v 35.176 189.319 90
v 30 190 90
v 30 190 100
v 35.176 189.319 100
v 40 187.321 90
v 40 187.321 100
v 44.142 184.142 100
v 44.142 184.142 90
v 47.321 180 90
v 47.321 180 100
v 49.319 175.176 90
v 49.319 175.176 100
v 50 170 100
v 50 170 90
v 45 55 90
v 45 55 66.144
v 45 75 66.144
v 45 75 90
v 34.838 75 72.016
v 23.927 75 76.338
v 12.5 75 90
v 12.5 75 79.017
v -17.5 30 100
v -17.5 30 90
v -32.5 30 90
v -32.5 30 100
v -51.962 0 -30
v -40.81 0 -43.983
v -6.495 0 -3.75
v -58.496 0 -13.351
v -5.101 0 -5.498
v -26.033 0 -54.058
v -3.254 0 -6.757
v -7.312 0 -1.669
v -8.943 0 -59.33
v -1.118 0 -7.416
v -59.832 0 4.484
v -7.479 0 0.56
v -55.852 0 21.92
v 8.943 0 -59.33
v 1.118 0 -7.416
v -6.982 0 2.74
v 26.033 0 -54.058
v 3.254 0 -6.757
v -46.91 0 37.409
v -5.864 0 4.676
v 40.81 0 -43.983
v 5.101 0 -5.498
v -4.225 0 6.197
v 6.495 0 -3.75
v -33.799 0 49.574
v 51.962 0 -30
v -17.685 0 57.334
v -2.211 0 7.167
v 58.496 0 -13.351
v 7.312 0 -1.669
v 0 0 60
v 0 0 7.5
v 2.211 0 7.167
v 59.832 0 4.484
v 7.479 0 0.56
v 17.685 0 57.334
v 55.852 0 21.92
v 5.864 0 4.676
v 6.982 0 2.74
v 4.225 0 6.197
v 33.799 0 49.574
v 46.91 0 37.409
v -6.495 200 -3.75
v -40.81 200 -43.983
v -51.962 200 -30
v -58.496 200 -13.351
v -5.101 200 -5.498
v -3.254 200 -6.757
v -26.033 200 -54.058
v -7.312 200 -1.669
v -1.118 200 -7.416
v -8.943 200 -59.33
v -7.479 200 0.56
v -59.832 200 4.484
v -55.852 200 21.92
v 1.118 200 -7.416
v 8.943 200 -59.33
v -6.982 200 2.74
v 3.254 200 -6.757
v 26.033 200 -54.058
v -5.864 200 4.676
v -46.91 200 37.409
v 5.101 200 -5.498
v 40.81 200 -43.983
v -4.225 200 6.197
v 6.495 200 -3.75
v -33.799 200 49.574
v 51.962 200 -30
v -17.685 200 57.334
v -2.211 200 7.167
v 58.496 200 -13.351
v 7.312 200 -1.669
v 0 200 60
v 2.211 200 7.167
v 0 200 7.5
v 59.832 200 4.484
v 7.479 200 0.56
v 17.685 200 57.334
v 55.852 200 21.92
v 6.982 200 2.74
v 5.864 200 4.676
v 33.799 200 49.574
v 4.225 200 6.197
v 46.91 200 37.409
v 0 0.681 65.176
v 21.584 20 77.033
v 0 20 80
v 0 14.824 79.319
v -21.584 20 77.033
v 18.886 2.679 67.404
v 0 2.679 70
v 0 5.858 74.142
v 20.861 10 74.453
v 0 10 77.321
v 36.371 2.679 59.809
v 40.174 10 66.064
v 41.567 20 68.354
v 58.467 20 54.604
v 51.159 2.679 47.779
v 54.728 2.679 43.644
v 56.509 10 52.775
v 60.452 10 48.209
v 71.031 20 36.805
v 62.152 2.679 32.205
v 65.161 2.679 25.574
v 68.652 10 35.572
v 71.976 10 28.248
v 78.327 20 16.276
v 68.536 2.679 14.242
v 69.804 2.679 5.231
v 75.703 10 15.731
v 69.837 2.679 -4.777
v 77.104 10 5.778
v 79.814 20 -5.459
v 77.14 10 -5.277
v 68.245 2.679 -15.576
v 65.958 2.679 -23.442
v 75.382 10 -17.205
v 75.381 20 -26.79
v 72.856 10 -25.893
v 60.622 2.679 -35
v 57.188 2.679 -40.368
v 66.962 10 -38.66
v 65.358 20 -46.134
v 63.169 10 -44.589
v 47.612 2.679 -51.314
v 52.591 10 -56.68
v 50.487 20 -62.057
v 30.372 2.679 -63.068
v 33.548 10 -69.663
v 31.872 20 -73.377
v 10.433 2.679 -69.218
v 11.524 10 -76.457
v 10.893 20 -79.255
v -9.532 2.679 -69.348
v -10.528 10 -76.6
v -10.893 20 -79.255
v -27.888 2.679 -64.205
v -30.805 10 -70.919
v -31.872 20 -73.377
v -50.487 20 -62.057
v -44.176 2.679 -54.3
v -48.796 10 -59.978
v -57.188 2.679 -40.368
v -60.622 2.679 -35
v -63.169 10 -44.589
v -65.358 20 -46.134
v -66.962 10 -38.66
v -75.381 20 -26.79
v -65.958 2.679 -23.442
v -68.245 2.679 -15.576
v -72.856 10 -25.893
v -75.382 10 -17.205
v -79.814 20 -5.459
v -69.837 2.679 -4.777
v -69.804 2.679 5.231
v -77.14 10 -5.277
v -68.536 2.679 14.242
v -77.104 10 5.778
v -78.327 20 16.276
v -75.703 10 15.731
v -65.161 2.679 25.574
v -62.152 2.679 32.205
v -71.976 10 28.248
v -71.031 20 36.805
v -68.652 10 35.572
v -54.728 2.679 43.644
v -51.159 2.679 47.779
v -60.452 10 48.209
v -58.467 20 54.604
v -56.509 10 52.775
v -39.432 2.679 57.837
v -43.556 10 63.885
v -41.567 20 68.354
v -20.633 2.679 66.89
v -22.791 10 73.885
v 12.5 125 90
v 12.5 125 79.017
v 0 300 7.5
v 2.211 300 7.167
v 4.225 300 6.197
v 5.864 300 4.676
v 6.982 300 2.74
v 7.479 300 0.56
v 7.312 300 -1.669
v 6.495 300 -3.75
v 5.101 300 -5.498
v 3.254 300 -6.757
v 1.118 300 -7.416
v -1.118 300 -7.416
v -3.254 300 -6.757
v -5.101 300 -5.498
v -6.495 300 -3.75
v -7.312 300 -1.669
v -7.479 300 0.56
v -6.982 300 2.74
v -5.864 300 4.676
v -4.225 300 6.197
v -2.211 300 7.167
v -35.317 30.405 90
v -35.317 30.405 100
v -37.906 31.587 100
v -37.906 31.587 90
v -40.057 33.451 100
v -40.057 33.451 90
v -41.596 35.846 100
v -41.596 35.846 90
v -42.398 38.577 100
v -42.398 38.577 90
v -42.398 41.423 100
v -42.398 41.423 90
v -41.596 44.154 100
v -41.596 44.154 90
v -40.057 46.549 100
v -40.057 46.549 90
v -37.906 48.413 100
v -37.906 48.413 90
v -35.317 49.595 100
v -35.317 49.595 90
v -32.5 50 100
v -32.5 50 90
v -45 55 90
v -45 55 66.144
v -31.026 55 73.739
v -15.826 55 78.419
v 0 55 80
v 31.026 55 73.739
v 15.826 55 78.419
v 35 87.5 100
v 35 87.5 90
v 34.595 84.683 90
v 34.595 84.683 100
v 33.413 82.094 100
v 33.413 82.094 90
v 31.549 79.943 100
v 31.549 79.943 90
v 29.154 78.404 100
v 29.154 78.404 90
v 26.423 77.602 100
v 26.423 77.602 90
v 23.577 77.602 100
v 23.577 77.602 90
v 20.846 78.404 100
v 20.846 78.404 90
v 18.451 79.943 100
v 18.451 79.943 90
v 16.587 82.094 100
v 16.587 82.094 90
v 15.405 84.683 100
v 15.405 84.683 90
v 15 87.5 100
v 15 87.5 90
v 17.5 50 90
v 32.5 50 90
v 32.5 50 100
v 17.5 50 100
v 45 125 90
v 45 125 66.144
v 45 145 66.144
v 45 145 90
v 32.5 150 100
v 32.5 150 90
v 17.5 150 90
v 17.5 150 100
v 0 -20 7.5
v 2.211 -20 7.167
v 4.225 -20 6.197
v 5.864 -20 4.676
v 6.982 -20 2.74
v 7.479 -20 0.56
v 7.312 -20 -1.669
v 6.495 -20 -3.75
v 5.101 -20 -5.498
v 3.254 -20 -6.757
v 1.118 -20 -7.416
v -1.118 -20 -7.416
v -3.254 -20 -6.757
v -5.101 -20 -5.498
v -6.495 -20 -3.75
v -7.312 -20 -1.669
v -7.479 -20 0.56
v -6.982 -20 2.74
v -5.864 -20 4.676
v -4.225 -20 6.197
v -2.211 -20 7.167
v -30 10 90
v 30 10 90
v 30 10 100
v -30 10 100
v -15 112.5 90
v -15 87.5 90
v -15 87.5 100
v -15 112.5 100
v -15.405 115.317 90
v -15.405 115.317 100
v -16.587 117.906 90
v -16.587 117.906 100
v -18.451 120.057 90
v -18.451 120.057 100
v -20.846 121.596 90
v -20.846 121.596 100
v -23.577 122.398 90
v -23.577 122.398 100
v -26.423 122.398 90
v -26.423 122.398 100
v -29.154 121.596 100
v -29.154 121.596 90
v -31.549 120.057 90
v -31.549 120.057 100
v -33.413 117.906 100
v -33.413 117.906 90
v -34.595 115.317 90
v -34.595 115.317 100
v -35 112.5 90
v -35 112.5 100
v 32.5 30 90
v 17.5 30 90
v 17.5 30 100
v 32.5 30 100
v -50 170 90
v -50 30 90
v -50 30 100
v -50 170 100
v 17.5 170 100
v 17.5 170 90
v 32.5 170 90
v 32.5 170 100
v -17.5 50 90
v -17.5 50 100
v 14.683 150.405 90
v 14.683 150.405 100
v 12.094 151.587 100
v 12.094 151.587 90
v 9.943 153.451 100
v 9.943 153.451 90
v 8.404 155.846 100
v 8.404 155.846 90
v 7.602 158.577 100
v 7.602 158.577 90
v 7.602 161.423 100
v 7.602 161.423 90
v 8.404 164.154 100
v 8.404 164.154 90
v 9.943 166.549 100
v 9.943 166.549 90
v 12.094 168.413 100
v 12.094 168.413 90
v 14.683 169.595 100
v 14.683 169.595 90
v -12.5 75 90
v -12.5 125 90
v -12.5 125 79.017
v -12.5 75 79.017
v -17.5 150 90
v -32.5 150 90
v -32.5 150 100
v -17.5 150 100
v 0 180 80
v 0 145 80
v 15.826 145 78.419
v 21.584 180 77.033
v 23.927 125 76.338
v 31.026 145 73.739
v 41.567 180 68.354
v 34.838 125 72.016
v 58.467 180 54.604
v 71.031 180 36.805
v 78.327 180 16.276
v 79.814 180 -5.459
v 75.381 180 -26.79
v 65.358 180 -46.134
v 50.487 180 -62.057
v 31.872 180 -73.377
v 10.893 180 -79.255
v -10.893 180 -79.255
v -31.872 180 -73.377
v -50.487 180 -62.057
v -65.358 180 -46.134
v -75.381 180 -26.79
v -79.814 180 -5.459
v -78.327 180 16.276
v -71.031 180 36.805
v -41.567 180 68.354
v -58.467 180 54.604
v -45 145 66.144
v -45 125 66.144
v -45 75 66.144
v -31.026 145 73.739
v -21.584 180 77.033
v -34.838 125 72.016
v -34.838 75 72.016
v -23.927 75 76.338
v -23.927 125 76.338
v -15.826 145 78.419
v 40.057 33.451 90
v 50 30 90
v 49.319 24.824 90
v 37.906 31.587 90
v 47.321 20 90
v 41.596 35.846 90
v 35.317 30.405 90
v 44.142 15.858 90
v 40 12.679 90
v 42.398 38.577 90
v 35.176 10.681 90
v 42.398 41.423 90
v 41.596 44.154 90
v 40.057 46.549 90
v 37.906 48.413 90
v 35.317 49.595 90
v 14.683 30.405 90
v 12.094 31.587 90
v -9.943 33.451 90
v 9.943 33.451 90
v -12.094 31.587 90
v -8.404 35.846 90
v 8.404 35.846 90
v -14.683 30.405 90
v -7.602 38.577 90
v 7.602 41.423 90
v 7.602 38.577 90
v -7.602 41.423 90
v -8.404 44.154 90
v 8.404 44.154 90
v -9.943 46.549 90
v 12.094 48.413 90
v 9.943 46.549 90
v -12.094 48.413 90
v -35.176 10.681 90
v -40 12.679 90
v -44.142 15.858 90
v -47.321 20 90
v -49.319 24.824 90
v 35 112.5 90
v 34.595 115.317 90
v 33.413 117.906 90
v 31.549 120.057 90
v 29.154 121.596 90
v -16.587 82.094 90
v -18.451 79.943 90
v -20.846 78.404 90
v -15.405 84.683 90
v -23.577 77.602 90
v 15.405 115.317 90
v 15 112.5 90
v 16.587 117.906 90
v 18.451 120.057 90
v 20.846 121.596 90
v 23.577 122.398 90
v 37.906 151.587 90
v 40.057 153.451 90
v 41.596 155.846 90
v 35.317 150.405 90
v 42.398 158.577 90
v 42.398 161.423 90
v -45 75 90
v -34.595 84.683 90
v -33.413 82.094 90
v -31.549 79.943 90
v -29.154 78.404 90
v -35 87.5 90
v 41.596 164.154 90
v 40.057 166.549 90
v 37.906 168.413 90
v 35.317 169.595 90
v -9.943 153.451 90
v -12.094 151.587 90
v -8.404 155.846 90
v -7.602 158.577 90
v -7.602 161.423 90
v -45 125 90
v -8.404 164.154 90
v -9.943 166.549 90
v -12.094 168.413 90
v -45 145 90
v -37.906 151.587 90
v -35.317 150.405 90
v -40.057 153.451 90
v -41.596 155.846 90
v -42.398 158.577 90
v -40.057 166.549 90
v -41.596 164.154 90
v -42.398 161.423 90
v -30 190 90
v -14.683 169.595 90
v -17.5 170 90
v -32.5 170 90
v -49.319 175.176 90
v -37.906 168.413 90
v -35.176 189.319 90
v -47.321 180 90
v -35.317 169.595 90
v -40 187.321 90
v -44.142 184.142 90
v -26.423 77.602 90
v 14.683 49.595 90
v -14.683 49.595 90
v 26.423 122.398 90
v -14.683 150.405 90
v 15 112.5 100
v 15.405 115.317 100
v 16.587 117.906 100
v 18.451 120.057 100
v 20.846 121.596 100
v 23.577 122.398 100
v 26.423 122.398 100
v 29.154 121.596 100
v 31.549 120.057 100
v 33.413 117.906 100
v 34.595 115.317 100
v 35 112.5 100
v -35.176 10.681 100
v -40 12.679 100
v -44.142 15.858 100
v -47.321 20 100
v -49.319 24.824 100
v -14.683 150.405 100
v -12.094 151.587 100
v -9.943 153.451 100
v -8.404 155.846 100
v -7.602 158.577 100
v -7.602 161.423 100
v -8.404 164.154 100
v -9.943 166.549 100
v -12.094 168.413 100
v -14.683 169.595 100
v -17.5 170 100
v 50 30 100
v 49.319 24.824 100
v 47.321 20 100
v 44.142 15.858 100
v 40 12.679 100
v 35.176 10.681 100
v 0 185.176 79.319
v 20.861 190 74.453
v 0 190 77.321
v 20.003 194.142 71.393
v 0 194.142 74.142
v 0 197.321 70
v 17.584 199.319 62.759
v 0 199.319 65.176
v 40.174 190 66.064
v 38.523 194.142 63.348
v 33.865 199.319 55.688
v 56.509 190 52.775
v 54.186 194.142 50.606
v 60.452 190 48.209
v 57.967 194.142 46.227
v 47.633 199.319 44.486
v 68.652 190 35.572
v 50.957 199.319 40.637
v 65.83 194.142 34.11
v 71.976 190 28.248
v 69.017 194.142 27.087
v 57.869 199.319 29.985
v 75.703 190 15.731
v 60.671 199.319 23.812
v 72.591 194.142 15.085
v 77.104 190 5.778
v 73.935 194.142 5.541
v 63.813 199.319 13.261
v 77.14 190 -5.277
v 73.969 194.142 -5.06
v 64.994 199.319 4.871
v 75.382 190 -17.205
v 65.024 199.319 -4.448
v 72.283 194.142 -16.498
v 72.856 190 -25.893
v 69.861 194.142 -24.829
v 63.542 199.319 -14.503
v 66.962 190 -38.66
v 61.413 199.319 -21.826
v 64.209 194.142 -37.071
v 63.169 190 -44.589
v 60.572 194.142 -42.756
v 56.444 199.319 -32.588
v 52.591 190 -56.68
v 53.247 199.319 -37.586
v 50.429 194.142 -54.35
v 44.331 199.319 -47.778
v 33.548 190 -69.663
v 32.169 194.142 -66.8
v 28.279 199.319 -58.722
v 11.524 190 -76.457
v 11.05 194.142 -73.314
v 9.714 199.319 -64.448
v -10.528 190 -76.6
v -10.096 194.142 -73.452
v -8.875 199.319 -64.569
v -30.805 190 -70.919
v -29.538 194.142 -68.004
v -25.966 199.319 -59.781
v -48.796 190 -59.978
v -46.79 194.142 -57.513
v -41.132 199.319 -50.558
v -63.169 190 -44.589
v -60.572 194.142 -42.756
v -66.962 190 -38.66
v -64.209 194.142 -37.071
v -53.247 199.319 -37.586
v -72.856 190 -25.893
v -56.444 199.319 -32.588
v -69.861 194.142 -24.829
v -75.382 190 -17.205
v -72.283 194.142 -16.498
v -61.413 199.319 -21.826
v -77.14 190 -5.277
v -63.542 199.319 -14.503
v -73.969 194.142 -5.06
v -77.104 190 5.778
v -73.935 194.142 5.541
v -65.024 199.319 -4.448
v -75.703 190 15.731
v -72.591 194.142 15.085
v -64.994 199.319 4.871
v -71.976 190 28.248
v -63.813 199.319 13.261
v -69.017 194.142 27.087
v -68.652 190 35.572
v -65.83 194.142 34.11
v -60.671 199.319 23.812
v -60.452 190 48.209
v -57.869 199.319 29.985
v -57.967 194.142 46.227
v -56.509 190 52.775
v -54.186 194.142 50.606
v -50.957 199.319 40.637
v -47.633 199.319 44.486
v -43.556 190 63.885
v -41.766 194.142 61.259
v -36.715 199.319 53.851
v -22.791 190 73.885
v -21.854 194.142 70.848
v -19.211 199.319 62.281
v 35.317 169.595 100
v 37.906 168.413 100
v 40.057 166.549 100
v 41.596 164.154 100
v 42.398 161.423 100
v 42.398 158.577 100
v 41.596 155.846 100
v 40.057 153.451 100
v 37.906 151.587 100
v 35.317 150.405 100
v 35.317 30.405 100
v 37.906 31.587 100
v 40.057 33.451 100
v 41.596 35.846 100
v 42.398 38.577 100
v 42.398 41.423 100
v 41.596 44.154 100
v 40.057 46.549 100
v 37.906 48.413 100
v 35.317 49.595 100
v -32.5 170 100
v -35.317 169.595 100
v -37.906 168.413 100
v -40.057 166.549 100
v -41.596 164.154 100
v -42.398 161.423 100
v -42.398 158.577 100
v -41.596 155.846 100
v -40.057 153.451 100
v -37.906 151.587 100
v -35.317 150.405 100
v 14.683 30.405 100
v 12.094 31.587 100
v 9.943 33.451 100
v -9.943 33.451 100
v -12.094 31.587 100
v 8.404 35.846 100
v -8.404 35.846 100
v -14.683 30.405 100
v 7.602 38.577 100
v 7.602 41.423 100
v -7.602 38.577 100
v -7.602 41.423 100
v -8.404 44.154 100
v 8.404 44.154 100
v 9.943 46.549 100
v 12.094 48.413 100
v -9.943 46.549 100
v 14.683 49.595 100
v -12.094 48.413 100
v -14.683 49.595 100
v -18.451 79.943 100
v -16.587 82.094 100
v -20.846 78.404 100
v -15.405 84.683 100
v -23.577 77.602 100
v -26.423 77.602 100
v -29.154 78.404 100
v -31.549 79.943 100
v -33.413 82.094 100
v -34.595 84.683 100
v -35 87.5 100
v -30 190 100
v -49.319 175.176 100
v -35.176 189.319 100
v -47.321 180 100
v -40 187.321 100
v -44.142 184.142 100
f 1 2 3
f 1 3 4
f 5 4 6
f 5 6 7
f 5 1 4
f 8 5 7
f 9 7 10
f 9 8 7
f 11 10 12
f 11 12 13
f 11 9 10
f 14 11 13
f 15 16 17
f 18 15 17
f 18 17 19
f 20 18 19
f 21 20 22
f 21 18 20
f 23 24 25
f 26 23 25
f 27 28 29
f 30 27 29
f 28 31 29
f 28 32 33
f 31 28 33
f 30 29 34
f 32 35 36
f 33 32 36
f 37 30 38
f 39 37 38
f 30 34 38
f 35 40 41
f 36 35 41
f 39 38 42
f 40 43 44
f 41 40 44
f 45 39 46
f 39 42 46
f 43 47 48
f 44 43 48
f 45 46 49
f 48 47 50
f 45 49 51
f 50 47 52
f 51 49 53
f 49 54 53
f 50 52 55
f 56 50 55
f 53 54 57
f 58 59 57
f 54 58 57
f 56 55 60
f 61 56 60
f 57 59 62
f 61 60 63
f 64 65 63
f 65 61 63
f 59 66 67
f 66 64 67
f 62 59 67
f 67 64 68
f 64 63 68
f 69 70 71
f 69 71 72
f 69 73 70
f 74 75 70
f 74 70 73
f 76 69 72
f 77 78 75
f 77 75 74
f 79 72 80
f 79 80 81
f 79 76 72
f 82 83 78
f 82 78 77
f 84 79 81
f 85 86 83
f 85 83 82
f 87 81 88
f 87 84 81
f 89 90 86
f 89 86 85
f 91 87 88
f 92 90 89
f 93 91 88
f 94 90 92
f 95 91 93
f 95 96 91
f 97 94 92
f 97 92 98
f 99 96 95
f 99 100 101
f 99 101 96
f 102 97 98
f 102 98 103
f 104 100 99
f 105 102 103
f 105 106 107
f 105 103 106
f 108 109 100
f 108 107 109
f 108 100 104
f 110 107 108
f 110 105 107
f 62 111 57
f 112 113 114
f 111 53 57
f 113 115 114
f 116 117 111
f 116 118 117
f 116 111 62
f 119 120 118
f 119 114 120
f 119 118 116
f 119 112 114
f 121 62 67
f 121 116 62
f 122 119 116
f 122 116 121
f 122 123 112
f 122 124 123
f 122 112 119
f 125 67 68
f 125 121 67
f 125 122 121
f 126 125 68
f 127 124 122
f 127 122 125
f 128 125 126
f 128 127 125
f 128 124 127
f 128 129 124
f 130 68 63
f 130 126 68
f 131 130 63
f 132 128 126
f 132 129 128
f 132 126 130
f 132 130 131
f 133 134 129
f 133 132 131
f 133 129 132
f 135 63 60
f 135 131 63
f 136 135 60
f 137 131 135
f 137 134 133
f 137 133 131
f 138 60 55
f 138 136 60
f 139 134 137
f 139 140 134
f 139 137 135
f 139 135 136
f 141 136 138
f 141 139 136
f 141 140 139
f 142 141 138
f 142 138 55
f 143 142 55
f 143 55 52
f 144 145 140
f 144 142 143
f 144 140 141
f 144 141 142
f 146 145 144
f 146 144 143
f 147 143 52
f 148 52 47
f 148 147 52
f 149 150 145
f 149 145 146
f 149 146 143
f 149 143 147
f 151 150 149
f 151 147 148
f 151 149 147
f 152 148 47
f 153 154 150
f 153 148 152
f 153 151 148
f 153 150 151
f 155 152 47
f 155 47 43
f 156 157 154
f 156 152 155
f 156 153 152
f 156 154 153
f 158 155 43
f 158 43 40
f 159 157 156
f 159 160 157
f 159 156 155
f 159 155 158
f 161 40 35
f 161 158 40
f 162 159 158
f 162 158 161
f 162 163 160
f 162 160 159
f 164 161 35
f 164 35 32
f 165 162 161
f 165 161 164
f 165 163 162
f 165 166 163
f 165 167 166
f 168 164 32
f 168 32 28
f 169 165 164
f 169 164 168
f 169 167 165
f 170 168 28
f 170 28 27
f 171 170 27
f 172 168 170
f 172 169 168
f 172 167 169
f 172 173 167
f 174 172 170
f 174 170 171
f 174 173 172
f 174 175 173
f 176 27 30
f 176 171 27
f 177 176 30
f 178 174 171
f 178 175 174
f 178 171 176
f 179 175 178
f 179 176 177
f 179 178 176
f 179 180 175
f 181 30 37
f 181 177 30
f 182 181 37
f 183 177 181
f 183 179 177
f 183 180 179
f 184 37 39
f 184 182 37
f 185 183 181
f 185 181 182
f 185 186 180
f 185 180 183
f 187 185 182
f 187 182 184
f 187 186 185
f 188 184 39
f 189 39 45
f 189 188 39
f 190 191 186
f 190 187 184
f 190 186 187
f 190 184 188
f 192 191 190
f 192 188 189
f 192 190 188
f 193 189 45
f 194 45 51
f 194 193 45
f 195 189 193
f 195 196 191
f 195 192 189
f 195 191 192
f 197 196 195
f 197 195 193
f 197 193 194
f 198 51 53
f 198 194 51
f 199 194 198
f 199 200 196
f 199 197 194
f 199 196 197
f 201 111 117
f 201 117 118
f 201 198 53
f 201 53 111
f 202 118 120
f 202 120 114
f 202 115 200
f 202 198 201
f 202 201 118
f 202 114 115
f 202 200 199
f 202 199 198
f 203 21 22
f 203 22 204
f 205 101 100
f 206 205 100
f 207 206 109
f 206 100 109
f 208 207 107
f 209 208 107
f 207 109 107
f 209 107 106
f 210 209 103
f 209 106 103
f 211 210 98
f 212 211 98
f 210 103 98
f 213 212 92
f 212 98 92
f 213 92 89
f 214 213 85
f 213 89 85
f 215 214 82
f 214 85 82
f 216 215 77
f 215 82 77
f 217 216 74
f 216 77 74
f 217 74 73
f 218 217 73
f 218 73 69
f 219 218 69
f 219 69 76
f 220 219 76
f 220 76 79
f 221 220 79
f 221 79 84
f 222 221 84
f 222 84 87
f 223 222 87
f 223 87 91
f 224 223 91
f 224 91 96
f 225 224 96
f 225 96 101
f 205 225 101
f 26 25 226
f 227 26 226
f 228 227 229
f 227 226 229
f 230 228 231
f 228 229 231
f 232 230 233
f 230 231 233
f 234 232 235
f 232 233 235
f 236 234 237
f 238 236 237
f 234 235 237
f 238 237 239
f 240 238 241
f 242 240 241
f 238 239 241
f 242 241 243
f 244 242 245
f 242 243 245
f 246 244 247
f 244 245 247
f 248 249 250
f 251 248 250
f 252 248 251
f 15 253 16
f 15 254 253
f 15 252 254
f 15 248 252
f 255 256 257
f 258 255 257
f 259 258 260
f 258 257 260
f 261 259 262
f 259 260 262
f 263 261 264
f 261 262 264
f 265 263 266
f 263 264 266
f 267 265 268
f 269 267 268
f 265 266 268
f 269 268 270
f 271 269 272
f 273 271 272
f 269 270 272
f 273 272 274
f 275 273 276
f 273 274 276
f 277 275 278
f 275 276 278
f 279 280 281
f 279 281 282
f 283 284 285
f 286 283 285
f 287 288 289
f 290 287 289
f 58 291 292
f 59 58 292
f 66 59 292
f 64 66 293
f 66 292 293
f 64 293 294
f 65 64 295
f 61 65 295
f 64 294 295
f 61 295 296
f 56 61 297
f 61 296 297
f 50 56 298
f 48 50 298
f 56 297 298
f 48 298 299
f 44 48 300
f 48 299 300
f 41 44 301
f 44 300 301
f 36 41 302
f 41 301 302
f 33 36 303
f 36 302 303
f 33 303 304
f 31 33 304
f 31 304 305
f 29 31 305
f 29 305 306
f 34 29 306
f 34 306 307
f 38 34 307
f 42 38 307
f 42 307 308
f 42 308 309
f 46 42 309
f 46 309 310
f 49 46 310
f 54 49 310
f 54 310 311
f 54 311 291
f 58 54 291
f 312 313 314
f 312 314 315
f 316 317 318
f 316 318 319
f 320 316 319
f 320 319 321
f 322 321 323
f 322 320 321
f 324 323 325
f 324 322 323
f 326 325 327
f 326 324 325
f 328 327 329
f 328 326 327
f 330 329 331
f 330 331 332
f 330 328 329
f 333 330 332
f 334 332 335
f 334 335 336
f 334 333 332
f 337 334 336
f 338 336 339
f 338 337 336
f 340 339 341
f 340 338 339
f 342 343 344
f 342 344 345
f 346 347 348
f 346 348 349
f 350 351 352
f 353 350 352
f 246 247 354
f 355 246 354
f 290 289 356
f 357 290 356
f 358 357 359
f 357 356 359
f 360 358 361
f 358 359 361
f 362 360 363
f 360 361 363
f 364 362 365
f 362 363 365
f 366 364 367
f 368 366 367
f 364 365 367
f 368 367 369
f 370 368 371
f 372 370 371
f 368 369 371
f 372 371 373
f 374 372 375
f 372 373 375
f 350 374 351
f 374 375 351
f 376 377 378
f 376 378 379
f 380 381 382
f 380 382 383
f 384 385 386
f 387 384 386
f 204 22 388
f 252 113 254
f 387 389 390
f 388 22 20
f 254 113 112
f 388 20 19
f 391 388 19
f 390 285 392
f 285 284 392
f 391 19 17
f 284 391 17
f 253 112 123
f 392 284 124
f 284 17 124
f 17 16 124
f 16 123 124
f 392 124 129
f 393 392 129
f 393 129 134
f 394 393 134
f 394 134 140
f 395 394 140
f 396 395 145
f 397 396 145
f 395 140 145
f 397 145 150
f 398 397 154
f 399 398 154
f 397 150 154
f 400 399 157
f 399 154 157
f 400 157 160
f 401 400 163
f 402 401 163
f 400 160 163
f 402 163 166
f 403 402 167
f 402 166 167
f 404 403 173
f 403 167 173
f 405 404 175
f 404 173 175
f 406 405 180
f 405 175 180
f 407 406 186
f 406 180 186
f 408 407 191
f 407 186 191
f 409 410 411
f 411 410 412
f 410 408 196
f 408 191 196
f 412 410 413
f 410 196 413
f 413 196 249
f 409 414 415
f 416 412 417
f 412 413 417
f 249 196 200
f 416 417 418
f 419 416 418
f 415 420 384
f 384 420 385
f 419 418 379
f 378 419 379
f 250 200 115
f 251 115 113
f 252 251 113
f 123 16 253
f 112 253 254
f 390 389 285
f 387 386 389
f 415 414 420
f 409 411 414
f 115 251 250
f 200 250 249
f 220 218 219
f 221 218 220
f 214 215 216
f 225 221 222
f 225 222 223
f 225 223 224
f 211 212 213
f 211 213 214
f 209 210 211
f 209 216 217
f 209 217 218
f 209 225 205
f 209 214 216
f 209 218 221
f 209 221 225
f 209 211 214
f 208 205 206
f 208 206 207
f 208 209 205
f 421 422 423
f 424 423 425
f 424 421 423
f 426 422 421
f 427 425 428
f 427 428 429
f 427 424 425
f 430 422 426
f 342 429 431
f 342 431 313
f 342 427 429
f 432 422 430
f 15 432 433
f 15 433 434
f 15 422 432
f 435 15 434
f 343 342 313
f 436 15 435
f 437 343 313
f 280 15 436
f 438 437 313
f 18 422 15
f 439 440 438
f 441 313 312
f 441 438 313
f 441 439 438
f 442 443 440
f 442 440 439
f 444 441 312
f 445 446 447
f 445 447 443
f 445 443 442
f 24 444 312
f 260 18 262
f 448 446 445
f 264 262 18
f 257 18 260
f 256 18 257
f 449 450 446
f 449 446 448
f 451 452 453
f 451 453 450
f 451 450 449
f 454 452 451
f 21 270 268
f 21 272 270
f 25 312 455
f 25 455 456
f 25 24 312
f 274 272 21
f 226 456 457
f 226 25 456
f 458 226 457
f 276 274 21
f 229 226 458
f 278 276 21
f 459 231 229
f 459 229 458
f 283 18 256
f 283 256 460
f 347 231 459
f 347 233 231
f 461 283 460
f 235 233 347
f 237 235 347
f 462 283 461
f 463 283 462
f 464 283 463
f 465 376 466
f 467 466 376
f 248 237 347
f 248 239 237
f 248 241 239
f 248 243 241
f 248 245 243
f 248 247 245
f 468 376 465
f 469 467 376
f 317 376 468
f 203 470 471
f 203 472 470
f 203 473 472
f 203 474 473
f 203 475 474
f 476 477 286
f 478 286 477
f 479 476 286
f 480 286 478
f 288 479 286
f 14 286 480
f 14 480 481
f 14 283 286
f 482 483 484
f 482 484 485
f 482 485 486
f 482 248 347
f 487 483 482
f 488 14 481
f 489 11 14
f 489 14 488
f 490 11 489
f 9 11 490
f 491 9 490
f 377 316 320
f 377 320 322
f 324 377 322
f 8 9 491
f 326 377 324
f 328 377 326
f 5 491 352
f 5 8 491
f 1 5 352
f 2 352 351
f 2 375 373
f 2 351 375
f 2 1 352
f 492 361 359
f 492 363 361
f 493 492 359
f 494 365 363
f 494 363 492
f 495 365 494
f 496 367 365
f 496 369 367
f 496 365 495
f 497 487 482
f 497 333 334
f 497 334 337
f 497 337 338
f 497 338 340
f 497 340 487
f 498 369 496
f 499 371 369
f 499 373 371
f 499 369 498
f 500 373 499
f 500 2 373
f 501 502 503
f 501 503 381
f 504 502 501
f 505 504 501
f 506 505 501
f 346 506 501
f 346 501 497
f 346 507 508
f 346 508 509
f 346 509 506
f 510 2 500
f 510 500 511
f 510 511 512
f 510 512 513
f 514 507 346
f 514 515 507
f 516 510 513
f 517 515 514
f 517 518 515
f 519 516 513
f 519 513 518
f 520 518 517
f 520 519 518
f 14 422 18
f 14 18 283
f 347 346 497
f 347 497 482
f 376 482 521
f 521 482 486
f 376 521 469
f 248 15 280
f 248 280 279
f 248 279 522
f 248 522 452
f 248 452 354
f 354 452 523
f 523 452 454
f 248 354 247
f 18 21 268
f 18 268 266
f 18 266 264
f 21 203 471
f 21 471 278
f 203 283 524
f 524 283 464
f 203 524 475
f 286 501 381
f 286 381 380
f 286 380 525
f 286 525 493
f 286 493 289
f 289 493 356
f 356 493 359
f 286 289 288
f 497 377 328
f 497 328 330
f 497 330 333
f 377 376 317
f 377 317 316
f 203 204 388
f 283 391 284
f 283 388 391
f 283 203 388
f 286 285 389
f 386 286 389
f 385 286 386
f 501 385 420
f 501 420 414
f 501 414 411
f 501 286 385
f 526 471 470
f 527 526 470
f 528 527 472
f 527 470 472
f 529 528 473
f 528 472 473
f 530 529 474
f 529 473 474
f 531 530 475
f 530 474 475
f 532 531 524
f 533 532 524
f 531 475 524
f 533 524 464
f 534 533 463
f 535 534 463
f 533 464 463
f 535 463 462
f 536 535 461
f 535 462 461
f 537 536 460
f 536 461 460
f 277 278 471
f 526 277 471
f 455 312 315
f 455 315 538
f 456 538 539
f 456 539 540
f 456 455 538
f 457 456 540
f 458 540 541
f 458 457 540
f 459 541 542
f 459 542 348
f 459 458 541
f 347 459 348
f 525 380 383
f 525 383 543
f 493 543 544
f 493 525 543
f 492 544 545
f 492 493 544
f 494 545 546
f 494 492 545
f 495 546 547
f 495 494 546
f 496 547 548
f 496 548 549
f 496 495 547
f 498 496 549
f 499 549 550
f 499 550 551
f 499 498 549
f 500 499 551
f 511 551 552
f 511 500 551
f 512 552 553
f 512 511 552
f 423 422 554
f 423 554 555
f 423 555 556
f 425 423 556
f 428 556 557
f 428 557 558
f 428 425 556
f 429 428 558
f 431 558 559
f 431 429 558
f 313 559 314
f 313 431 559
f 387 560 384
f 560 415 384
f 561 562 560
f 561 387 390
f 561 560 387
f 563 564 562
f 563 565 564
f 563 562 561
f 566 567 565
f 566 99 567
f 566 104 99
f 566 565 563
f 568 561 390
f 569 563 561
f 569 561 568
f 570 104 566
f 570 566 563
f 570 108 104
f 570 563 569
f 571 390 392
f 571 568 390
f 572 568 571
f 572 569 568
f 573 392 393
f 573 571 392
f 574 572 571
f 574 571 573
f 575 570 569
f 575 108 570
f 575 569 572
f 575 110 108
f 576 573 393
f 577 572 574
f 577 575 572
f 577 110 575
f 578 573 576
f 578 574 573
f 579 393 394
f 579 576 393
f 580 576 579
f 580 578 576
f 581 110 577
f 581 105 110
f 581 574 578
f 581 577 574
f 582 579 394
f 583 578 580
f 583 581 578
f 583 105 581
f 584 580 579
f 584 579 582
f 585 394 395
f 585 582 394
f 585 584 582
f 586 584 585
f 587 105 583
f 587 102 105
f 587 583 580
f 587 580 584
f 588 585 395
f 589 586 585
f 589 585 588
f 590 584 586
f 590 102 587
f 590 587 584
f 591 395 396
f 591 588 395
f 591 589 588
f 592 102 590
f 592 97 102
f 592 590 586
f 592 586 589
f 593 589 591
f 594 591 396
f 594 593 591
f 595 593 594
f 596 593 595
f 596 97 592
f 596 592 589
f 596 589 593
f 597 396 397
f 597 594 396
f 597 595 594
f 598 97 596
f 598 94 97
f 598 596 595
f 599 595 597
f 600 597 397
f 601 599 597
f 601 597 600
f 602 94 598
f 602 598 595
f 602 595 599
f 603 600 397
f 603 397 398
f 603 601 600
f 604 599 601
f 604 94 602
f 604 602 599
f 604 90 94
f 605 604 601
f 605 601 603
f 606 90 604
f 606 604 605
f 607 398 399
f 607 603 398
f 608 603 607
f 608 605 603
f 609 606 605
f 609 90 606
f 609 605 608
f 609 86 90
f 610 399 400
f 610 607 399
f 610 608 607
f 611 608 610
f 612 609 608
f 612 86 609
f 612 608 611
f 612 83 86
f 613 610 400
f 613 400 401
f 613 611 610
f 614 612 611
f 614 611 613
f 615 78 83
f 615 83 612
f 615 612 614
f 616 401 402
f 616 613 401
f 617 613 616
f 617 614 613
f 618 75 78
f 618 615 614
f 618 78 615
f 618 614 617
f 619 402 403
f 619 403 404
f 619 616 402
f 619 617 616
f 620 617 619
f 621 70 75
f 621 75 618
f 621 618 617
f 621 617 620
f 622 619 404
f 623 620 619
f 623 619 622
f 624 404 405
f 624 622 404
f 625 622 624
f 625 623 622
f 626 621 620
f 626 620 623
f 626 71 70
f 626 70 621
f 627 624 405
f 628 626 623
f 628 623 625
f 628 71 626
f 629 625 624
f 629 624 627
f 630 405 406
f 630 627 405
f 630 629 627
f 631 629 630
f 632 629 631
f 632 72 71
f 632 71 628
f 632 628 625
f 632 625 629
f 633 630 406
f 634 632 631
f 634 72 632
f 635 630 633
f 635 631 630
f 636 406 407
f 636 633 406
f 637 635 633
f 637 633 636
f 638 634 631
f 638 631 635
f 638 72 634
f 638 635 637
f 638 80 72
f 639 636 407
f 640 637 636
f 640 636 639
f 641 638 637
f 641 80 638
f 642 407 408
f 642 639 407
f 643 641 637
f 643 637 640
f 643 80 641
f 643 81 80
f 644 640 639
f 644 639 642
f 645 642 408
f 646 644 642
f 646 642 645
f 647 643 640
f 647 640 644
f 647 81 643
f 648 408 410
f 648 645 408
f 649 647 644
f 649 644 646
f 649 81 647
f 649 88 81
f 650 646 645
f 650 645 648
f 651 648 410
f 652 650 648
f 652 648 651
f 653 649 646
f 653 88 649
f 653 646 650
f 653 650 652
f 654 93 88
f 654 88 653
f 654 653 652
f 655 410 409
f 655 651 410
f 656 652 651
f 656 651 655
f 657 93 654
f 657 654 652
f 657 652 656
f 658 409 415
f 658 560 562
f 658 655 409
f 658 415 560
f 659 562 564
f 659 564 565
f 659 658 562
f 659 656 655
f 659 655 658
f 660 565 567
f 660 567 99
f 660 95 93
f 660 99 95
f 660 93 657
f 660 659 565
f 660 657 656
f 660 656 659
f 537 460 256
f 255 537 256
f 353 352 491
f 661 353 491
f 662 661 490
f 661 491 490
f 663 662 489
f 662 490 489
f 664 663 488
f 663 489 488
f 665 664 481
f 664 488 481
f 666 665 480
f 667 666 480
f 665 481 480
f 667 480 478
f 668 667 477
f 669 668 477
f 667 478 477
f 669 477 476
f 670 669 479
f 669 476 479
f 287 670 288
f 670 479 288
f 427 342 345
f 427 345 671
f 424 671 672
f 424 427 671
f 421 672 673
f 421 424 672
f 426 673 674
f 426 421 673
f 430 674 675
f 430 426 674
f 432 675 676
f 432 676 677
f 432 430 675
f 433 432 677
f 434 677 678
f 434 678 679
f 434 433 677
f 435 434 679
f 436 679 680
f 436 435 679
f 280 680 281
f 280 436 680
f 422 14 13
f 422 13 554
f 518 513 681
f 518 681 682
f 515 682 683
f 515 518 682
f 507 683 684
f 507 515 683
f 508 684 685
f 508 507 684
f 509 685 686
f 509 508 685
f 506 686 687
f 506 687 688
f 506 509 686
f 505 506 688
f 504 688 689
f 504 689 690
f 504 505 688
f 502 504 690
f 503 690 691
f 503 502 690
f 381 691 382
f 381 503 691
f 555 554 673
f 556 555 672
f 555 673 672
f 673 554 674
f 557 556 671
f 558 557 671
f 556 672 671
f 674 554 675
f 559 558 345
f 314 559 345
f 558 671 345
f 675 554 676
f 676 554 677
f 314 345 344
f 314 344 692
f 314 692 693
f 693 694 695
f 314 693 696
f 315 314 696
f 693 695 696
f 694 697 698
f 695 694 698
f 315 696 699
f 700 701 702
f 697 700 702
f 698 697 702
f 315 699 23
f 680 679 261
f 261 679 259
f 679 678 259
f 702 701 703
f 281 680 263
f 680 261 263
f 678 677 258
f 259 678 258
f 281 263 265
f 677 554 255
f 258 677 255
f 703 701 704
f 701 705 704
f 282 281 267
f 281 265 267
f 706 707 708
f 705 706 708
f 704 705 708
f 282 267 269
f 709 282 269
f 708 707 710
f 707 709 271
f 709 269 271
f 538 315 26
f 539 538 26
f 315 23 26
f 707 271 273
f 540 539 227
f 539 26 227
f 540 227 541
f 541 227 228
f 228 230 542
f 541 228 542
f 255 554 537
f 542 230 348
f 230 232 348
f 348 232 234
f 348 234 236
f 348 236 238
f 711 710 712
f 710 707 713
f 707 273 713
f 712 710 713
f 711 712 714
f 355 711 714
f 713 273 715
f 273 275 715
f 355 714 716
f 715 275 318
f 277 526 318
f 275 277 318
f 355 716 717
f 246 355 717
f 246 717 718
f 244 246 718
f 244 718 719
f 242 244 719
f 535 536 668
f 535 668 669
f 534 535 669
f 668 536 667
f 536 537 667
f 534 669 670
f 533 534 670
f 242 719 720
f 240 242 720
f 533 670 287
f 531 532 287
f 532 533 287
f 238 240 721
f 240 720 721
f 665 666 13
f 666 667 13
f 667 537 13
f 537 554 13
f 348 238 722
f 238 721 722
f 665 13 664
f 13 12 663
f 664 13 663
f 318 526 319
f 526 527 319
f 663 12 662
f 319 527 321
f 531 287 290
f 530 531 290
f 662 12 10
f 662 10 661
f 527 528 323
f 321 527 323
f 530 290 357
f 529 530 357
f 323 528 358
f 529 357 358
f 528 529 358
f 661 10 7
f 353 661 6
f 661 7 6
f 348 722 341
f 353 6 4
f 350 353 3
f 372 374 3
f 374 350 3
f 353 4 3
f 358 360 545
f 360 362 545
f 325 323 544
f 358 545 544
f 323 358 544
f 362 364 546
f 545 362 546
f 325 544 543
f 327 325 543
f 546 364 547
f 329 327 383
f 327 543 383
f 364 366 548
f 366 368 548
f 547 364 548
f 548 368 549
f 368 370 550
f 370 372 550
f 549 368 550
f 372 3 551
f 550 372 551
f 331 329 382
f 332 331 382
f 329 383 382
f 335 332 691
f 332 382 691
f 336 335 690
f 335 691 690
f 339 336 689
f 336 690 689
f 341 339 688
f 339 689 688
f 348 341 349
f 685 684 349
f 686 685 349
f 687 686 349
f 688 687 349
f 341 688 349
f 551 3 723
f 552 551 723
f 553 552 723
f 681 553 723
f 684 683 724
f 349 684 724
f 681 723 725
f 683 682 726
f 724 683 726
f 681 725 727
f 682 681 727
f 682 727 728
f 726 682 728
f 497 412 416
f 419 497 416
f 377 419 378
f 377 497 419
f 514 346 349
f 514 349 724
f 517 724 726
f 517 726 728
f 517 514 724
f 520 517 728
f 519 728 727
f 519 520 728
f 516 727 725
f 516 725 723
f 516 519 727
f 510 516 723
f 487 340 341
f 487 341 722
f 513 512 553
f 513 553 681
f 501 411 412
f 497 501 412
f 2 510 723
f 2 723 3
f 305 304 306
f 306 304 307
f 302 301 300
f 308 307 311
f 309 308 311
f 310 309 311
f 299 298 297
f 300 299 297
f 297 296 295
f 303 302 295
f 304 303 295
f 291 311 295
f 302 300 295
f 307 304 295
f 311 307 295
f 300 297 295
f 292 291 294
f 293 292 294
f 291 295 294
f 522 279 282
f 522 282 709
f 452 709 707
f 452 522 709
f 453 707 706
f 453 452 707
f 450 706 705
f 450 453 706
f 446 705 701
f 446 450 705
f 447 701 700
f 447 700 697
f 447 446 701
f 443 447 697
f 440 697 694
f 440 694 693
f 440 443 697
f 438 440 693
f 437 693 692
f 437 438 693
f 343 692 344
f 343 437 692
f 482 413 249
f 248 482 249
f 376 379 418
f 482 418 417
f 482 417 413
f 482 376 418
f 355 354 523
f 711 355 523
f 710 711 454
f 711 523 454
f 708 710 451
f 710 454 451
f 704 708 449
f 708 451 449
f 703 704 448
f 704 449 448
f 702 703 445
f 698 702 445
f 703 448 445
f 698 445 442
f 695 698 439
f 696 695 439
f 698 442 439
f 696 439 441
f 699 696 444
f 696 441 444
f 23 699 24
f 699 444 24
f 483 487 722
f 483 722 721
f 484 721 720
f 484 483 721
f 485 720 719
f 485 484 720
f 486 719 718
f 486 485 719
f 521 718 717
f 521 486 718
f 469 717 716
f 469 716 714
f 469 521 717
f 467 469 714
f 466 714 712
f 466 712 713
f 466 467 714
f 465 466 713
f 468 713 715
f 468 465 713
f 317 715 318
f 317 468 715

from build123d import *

# Parameters (mm, degrees)
SKETCH2_R                = 80
SKETCH2_R_2              = 7.5
BOSS_EXTRUDE1_DEPTH      = 200
BOSS_EXTRUDE2_DEPTH      = 300
BOSS_EXTRUDE2_DEPTH_BACK = 20
SKETCH2_2_R              = 7.5
FILLET1_R                = 20
BOSS_EXTRUDE3_DEPTH      = 10
CUT_EXTRUDE1_DEPTH       = 10
BOSS_EXTRUDE4_REACH      = 355.977
BOSS_EXTRUDE4_END_RADIUS = 80


with BuildPart() as part:
    # Sketch2 → Boss-Extrude1 (new body)
    with BuildSketch(Plane(origin=(0, 0, 0), x_dir=(1, 0, 0), z_dir=(0, 1, 0))):
        Circle(SKETCH2_R)
        Circle(SKETCH2_R_2, mode=Mode.SUBTRACT)
    extrude(amount=BOSS_EXTRUDE1_DEPTH)

    # Sketch2<2> → Boss-Extrude2 (add, two sides: drawn at the far end of the back side and taken through both)
    with BuildSketch(Plane(origin=(0, 0, 0), x_dir=(1, 0, 0), z_dir=(0, 1, 0)).offset(-BOSS_EXTRUDE2_DEPTH_BACK)):
        Circle(SKETCH2_2_R)
    extrude(amount=BOSS_EXTRUDE2_DEPTH + BOSS_EXTRUDE2_DEPTH_BACK)

    # Fillet1
    fillet1_edges = [part.edges().sort_by_distance(p)[0] for p in [
        (-80, 0, 0),
        (-80, 200, 0),
    ]]
    fillet(fillet1_edges, radius=FILLET1_R)



with BuildPart() as body_2:
    # Sketch3 → Boss-Extrude3 (new body)
    with BuildSketch(Plane.XY.offset(90)):
        with BuildLine():
            Line((-30, 190), (30, 190))
            ThreePointArc((30, 190), (44.142135624, 184.142135624), (50, 170))
            Line((50, 170), (50, 30))
            ThreePointArc((50, 30), (44.142135624, 15.857864376), (30, 10))
            Line((30, 10), (-30, 10))
            ThreePointArc((-30, 10), (-44.142135624, 15.857864376), (-50, 30))
            Line((-50, 30), (-50, 170))
            ThreePointArc((-50, 170), (-44.142135624, 184.142135624), (-30, 190))
        make_face()
    extrude(amount=BOSS_EXTRUDE3_DEPTH)

    # Sketch3<5> → Cut-Extrude1 (cut)
    with BuildSketch(Plane.XY.offset(90)):
        with BuildLine():
            Line((17.5, 170), (32.5, 170))
            ThreePointArc((32.5, 170), (42.5, 160), (32.5, 150))
            Line((32.5, 150), (17.5, 150))
            ThreePointArc((17.5, 150), (7.5, 160), (17.5, 170))
        make_face()
        with BuildLine():
            Line((15, 87.5), (15, 112.5))
            ThreePointArc((15, 112.5), (25, 122.5), (35, 112.5))
            Line((35, 112.5), (35, 87.5))
            ThreePointArc((35, 87.5), (25, 77.5), (15, 87.5))
        make_face()
        with BuildLine():
            Line((-17.5, 170), (-32.5, 170))
            ThreePointArc((-32.5, 170), (-42.5, 160), (-32.5, 150))
            Line((-32.5, 150), (-17.5, 150))
            ThreePointArc((-17.5, 150), (-7.5, 160), (-17.5, 170))
        make_face()
        with BuildLine():
            Line((17.5, 30), (32.5, 30))
            ThreePointArc((32.5, 30), (42.5, 40), (32.5, 50))
            Line((32.5, 50), (17.5, 50))
            ThreePointArc((17.5, 50), (7.5, 40), (17.5, 30))
        make_face()
        with BuildLine():
            Line((-17.5, 30), (-32.5, 30))
            ThreePointArc((-32.5, 30), (-42.5, 40), (-32.5, 50))
            Line((-32.5, 50), (-17.5, 50))
            ThreePointArc((-17.5, 50), (-7.5, 40), (-17.5, 30))
        make_face()
        with BuildLine():
            Line((-15, 87.5), (-15, 112.5))
            ThreePointArc((-15, 112.5), (-25, 122.5), (-35, 112.5))
            Line((-35, 112.5), (-35, 87.5))
            ThreePointArc((-35, 87.5), (-25, 77.5), (-15, 87.5))
        make_face()
    extrude(amount=CUT_EXTRUDE1_DEPTH, mode=Mode.SUBTRACT)


with BuildPart() as part_1:
    add(part.part)

    add(body_2.part)  # Boss-Extrude4 merges body 2
    # Boss-Extrude4: up to this cylinder (the profile starts outside it)
    boss_extrude4_end = Plane(origin=(0, 100, 0), z_dir=(0, -1, 0)) * Cylinder(BOSS_EXTRUDE4_END_RADIUS, 872.954, mode=Mode.PRIVATE)
    # Sketch6 → Boss-Extrude4 (add, up to the surface)
    with BuildSketch(Plane.XY.offset(90), mode=Mode.PRIVATE) as boss_extrude4_sk1:
        Polygon((-45, 75), (-45, 55), (45, 55), (45, 75), (12.5, 75), (12.5, 125), (45, 125), (45, 145), (-45, 145), (-45, 125), (-12.5, 125), (-12.5, 75), align=None)
    boss_extrude4_tool1 = extrude(boss_extrude4_sk1.sketch, amount=-BOSS_EXTRUDE4_REACH, mode=Mode.PRIVATE) - boss_extrude4_end
    add(boss_extrude4_tool1.solids().sort_by_distance((0, 100, 90))[0])


solid = part_1.part
